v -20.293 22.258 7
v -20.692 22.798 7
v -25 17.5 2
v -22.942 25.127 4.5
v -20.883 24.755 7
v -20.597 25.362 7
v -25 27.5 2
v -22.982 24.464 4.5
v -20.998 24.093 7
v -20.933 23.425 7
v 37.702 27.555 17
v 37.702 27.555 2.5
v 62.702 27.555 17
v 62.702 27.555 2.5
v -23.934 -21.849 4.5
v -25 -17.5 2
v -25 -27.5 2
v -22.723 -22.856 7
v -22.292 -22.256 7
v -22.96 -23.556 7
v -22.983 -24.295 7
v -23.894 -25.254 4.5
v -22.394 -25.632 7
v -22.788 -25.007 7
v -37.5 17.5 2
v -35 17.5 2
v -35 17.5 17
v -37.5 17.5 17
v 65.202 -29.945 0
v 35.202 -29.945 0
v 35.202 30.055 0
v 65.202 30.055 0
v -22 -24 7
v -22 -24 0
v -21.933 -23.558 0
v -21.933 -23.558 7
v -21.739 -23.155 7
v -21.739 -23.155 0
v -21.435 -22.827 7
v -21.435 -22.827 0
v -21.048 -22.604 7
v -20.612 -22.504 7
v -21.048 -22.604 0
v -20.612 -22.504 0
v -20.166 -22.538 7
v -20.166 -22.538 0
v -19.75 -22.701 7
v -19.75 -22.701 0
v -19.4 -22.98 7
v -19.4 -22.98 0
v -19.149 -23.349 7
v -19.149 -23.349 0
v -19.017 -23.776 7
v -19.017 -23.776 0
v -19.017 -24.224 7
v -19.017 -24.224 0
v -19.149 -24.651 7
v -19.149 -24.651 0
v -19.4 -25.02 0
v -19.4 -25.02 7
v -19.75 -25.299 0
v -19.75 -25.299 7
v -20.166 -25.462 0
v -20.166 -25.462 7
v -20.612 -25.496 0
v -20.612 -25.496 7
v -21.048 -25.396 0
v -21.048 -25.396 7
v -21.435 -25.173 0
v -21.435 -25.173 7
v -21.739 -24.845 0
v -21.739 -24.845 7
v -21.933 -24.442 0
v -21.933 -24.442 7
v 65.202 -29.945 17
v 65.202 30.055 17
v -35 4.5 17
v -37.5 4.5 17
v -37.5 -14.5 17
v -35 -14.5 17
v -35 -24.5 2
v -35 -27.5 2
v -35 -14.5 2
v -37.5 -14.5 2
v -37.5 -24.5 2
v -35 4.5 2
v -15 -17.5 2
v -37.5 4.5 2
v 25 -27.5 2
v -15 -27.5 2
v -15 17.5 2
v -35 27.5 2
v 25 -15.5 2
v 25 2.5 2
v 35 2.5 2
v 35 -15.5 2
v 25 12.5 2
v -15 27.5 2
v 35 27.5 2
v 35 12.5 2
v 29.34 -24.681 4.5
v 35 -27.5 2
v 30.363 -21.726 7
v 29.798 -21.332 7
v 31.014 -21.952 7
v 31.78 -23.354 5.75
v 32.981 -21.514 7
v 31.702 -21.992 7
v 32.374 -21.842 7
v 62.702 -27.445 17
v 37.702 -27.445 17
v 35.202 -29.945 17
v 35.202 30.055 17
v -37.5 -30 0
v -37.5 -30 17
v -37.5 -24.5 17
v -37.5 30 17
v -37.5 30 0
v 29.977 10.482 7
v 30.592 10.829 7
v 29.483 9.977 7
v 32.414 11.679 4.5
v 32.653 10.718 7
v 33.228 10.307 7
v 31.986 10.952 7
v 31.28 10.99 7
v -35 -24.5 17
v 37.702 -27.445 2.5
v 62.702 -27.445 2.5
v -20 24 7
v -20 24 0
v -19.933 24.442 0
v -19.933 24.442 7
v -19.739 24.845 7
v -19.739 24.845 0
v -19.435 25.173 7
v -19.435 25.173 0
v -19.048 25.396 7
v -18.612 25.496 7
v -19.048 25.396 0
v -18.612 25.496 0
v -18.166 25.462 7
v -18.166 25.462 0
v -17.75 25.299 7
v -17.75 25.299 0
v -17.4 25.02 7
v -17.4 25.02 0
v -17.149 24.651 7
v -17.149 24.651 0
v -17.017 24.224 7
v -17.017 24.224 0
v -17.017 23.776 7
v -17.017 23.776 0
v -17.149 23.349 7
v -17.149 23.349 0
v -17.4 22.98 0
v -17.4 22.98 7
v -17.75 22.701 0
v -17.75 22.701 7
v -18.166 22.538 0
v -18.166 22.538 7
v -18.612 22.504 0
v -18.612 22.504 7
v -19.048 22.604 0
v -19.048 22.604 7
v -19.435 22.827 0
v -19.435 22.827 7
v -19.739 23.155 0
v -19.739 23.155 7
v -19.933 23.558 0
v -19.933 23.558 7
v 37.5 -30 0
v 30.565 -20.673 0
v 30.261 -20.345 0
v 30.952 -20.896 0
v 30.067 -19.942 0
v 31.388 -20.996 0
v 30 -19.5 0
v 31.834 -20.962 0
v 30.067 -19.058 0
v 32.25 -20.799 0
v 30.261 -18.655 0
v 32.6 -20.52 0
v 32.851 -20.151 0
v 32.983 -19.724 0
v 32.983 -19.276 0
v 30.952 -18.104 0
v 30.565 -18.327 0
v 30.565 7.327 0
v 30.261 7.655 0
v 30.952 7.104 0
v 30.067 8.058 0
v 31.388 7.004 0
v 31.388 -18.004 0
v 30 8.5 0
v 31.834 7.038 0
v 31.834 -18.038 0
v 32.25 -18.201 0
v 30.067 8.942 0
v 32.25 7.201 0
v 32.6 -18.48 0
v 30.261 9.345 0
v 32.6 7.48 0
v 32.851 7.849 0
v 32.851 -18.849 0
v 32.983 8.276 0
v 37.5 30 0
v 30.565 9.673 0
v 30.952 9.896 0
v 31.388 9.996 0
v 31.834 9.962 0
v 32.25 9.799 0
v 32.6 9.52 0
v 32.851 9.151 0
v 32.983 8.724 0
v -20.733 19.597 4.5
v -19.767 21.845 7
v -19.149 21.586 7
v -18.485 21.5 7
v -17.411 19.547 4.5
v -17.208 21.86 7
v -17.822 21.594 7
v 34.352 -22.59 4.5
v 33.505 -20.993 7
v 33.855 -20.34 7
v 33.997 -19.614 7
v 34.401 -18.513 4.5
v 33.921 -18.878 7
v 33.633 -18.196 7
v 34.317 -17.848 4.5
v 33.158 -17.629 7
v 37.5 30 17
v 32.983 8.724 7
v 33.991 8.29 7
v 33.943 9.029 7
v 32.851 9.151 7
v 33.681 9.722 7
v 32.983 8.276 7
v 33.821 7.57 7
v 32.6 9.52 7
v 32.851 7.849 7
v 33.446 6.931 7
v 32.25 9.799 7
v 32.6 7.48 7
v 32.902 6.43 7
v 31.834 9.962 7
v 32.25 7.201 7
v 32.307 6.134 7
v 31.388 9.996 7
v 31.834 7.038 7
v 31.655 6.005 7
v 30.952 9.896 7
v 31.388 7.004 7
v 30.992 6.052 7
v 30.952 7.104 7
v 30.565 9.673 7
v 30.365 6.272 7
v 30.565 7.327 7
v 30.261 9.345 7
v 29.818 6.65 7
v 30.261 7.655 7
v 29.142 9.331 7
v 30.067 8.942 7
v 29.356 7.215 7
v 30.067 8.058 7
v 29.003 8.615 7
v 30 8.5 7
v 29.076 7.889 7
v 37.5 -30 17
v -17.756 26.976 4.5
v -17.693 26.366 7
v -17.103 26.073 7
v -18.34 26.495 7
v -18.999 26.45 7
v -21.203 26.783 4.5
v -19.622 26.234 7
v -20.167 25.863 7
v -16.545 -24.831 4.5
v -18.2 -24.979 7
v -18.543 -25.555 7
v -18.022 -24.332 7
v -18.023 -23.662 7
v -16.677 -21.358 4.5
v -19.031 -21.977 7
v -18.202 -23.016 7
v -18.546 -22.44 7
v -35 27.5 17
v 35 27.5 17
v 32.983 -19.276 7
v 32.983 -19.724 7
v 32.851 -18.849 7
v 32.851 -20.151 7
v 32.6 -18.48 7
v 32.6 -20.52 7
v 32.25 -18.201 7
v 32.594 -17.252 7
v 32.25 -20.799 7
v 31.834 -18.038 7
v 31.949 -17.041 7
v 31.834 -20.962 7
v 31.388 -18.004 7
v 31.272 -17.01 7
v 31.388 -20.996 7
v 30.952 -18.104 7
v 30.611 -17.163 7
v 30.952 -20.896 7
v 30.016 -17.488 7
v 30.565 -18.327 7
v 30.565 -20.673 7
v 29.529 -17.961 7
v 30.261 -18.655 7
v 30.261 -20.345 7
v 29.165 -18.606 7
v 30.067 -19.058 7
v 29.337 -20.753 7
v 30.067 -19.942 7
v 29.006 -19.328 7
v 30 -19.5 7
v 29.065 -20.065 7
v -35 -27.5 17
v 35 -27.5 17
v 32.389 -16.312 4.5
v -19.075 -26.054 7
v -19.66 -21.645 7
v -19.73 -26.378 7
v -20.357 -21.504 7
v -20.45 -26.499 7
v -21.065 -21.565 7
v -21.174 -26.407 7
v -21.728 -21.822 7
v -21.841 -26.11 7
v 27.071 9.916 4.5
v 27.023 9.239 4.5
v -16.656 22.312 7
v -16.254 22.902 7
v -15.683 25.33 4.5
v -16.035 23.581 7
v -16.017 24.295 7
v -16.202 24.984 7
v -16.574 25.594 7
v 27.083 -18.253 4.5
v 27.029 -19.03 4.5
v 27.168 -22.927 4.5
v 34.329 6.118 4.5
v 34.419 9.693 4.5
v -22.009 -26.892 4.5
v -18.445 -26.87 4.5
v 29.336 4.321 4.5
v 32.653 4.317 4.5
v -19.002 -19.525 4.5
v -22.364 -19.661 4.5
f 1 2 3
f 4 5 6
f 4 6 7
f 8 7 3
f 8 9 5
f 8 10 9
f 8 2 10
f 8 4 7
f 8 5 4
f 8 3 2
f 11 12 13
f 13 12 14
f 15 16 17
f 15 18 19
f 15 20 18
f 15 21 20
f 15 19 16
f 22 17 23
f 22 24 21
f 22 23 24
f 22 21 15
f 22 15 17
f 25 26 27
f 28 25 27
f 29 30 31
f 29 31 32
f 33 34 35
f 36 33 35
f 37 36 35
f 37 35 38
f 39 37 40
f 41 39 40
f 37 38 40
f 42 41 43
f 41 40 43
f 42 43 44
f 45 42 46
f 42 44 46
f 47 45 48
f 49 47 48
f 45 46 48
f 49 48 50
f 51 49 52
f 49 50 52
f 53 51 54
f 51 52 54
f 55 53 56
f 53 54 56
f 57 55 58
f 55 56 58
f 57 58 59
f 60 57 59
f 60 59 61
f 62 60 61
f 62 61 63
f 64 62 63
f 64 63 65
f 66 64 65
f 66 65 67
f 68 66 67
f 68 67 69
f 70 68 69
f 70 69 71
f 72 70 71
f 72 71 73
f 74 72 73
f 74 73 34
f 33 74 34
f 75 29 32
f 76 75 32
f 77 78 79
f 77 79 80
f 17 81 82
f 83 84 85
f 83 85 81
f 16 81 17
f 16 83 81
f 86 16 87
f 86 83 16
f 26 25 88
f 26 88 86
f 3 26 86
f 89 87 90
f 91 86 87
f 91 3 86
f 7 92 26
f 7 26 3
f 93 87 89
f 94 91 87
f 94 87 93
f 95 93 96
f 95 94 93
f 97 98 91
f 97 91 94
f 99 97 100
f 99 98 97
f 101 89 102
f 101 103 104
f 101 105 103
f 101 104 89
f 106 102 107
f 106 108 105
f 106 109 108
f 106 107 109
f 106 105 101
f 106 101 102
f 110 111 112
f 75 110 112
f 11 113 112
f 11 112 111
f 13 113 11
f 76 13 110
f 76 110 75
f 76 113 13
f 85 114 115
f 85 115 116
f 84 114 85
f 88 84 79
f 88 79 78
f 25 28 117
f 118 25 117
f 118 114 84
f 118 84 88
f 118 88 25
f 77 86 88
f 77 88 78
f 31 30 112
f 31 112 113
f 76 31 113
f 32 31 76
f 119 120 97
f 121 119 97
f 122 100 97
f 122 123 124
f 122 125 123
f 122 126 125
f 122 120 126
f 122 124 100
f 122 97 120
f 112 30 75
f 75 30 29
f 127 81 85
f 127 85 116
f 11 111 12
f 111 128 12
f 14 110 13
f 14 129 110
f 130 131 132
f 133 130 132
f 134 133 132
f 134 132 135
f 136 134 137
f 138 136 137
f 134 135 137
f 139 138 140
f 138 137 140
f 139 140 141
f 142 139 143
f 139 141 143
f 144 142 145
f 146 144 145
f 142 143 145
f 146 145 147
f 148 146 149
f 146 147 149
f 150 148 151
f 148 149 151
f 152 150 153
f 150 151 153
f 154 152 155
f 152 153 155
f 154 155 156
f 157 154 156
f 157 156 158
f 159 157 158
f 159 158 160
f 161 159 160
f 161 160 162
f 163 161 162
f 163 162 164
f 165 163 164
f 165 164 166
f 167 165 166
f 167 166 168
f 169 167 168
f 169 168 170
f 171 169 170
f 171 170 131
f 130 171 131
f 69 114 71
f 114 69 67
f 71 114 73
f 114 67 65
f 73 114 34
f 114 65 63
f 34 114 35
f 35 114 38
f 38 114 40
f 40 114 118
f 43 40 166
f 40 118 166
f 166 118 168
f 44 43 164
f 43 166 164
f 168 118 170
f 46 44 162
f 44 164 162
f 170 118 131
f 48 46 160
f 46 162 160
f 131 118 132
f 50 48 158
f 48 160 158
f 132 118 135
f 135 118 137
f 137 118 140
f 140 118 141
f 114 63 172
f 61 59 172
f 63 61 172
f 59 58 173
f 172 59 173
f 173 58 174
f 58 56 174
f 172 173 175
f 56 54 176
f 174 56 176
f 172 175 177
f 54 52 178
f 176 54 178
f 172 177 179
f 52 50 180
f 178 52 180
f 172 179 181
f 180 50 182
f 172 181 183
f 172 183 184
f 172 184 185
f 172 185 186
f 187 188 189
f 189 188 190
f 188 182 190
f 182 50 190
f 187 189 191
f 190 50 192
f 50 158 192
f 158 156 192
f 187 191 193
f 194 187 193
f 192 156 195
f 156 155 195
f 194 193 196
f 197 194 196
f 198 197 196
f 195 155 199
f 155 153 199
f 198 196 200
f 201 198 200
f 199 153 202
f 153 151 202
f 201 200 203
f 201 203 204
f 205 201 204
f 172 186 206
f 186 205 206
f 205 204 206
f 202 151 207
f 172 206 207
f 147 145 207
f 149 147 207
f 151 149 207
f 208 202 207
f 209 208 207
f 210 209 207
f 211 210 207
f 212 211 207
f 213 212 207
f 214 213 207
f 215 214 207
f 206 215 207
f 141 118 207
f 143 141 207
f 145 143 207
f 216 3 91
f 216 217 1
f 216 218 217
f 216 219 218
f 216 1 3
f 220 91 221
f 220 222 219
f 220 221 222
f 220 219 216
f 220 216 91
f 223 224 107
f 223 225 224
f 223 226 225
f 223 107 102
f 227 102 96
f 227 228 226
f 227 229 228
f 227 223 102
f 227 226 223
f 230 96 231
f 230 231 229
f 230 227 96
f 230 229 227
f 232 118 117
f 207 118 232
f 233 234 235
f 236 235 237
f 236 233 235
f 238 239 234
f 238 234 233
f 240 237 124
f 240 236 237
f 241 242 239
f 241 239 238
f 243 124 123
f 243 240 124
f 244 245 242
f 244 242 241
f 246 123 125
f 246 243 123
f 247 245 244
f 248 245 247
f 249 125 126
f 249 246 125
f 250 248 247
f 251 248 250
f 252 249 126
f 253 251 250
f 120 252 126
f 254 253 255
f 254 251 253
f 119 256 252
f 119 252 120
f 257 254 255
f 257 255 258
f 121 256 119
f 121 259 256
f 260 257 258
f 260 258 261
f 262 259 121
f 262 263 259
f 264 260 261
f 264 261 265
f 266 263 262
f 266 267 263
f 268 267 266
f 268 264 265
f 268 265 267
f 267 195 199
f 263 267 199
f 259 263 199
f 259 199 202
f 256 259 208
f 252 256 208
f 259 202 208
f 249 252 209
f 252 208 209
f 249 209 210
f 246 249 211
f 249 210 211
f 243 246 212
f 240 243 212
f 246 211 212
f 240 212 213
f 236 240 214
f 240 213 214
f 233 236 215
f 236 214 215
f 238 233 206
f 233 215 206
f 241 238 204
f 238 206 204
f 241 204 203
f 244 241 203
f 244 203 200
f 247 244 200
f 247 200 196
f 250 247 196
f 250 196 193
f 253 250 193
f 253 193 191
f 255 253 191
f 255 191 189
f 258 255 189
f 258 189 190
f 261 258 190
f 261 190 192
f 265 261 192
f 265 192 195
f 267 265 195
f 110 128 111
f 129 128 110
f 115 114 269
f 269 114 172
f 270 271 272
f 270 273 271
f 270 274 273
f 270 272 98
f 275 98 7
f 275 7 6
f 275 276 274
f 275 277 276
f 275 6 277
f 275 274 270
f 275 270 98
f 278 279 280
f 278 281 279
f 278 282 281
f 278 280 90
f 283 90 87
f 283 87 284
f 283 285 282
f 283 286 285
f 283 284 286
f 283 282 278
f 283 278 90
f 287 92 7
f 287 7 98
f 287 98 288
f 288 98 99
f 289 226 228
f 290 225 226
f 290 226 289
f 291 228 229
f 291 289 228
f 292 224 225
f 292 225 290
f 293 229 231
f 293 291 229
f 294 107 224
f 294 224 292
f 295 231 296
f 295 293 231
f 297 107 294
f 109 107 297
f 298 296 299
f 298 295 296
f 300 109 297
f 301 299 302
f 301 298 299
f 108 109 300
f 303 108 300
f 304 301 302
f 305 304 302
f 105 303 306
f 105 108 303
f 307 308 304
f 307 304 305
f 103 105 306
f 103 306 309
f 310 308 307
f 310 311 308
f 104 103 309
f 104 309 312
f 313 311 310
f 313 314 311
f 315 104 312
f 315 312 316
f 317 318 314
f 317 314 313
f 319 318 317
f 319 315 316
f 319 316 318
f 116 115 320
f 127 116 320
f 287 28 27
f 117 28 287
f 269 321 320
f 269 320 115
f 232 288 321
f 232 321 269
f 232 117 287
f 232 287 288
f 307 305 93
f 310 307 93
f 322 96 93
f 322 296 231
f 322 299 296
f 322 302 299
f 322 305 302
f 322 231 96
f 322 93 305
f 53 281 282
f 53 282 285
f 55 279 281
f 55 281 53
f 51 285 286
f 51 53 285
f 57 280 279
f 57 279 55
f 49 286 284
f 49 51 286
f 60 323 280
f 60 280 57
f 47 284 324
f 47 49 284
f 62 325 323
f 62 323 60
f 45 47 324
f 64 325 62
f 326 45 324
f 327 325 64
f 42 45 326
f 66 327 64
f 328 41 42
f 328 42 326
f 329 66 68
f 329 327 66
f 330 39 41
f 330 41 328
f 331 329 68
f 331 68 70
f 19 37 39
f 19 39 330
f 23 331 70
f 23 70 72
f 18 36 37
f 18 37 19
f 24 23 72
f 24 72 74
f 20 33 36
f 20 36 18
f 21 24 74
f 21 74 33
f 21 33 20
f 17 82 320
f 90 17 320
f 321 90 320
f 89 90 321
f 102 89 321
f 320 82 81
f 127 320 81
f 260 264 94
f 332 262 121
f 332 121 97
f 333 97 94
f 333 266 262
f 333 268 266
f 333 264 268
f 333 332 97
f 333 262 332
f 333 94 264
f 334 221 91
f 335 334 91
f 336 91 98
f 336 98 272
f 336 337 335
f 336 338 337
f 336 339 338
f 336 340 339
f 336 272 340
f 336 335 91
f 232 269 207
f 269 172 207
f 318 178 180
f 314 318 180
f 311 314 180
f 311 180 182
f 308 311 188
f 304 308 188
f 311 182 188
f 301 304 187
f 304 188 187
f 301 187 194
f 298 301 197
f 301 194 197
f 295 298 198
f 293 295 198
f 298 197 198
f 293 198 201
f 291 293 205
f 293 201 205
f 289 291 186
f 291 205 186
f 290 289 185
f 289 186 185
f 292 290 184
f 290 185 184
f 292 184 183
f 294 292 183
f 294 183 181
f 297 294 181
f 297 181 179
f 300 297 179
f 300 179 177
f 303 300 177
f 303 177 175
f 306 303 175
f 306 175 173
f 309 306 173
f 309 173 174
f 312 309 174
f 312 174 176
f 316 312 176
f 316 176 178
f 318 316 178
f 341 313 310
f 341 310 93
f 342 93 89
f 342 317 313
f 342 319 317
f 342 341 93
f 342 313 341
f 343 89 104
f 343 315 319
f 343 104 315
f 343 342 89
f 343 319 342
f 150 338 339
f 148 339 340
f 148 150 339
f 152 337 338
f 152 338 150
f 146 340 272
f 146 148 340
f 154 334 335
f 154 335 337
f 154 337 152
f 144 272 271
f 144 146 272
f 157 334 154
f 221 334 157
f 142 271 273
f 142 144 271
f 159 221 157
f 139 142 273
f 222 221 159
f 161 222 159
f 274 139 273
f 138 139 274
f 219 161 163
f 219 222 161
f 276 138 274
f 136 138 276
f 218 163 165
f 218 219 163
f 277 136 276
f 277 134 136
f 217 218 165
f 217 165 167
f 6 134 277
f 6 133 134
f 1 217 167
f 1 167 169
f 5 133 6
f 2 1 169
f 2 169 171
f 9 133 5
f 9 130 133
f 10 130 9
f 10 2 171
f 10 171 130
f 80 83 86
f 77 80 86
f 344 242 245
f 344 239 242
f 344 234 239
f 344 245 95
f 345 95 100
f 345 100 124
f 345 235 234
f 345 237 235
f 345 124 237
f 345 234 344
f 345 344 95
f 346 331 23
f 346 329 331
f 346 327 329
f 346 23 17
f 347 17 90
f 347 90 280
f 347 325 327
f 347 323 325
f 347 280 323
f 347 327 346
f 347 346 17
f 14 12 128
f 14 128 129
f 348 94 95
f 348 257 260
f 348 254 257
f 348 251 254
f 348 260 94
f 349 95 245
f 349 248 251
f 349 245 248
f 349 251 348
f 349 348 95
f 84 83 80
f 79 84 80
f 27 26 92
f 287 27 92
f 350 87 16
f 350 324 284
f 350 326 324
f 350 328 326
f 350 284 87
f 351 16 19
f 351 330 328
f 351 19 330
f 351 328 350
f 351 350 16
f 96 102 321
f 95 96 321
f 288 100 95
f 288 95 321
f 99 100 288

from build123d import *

# Parameters (mm, degrees)
F0_W      = 75
F0_H      = 60
F1_DEPTH  = 2
F2_W      = 75
F2_H      = 60
F2_W_2    = 70
F2_H_2    = 55
F3_DEPTH  = 15
F4_W      = 10
F4_H      = 10
F4_H_2    = 12
F11_D     = 3
F12_W     = 10
F12_H     = 15
F12_W_2   = 13
F13_DEPTH = 2.5
F14_W     = 30
F14_H     = 60
F15_DEPTH = 17
F16_T     = -2.5


with BuildPart() as f1:
    # F0 (on Top) → F1 (new body)
    with BuildSketch(Plane.XY):
        Rectangle(F0_W, F0_H)
    extrude(amount=F1_DEPTH)

    # F2 (on face) → F3 (join)
    with BuildSketch(Plane.XY.offset(2)):
        Rectangle(F2_W, F2_H)
        Rectangle(F2_W_2, F2_H_2, mode=Mode.SUBTRACT)
    extrude(amount=F3_DEPTH)

    # F4 (on face) → F7 section 0
    with BuildSketch(Plane.XY.offset(2)):
        with Locations((-20, 22.5)):
            Rectangle(F4_W, F4_H)
    # F6 (on offset) → F7 section 1
    with BuildSketch(Plane.XY.offset(7)):
        with BuildLine():
            ThreePointArc((-20.293224, 22.258062), (-18.819991, 21.520563), (-17.207788, 21.859863))
            ThreePointArc((-17.207788, 21.859863), (-16.000779, 23.937586), (-17.102572, 26.072968))
            ThreePointArc((-17.102572, 26.072968), (-18.99862, 26.449771), (-20.596534, 25.361817))
            ThreePointArc((-20.596534, 25.361817), (-20.988147, 23.756849), (-20.293224, 22.258062))
        make_face()
    loft()

    # F4 (on face) → F8 section 0
    with BuildSketch(Plane.XY.offset(2)):
        with Locations((30, 7.5)):
            Rectangle(F4_W, F4_H)
    # F6 (on offset) → F8 section 1
    with BuildSketch(Plane.XY.offset(7)):
        with BuildLine():
            ThreePointArc((29.818347, 6.650123), (31.321839, 6.006356), (32.901582, 6.429838))
            ThreePointArc((32.901582, 6.429838), (33.991199, 8.290416), (33.227758, 10.306891))
            ThreePointArc((33.227758, 10.306891), (31.280438, 10.99034), (29.482742, 9.976709))
            ThreePointArc((29.482742, 9.976709), (29.012626, 8.249059), (29.818347, 6.650123))
        make_face()
    loft()

    # F4 (on face) → F9 section 0
    with BuildSketch(Plane.XY.offset(2)):
        with Locations((30, -21.5)):
            Rectangle(F4_W, F4_H_2)
    # F6 (on offset) → F9 section 1
    with BuildSketch(Plane.XY.offset(7)):
        with BuildLine():
            ThreePointArc((29.529474, -17.961486), (29.007923, -19.698875), (29.798415, -21.331559))
            ThreePointArc((29.798415, -21.331559), (31.356554, -21.995881), (32.980542, -21.514447))
            ThreePointArc((32.980542, -21.514447), (33.997404, -19.613892), (33.157749, -17.628672))
            ThreePointArc((33.157749, -17.628672), (31.271639, -17.010452), (29.529474, -17.961486))
        make_face()
    loft()

    # F4 (on face) → F10 section 0
    with BuildSketch(Plane.XY.offset(2)):
        with Locations((-20, -22.5)):
            Rectangle(F4_W, F4_H)
    # F6 (on offset) → F10 section 1
    with BuildSketch(Plane.XY.offset(7)):
        with BuildLine():
            ThreePointArc((-19.030994, -21.977126), (-20.71328, -21.509114), (-22.291516, -22.256305))
            ThreePointArc((-22.291516, -22.256305), (-22.998858, -23.92446), (-22.393571, -25.632296))
            ThreePointArc((-22.393571, -25.632296), (-20.449964, -26.499499), (-18.54262, -25.555205))
            ThreePointArc((-18.54262, -25.555205), (-18.022967, -23.661909), (-19.030994, -21.977126))
        make_face()
    loft()

    # F11 (through all)
    with Locations(Plane.XY.offset(7)):
        with Locations((-18.5, 24), (31.5, 8.5), (31.5, -19.5), (-20.5, -24)):
            Hole(F11_D / 2)

    # F12 (on face) → F13 (cut, through all)
    with BuildSketch(Plane.YZ.offset(-35)):
        with Locations((-19.5, 9.5)):
            Rectangle(F12_W, F12_H)
        with Locations((11, 9.5)):
            Rectangle(F12_W_2, F12_H)
    extrude(amount=-F13_DEPTH, mode=Mode.SUBTRACT)


with BuildPart() as f15:
    # F14 (on Top) → F15 (new body)
    with BuildSketch(Plane.XY):
        with Locations((50.202258, 0.055048)):
            Rectangle(F14_W, F14_H)
    extrude(amount=F15_DEPTH)

    # F16
    f16_openings = [f15.faces().sort_by_distance(p)[0] for p in [
        (50.202258, 0.055048, 17),
    ]]
    offset(amount=F16_T, openings=f16_openings)


solid = Compound([f1.part, f15.part])
